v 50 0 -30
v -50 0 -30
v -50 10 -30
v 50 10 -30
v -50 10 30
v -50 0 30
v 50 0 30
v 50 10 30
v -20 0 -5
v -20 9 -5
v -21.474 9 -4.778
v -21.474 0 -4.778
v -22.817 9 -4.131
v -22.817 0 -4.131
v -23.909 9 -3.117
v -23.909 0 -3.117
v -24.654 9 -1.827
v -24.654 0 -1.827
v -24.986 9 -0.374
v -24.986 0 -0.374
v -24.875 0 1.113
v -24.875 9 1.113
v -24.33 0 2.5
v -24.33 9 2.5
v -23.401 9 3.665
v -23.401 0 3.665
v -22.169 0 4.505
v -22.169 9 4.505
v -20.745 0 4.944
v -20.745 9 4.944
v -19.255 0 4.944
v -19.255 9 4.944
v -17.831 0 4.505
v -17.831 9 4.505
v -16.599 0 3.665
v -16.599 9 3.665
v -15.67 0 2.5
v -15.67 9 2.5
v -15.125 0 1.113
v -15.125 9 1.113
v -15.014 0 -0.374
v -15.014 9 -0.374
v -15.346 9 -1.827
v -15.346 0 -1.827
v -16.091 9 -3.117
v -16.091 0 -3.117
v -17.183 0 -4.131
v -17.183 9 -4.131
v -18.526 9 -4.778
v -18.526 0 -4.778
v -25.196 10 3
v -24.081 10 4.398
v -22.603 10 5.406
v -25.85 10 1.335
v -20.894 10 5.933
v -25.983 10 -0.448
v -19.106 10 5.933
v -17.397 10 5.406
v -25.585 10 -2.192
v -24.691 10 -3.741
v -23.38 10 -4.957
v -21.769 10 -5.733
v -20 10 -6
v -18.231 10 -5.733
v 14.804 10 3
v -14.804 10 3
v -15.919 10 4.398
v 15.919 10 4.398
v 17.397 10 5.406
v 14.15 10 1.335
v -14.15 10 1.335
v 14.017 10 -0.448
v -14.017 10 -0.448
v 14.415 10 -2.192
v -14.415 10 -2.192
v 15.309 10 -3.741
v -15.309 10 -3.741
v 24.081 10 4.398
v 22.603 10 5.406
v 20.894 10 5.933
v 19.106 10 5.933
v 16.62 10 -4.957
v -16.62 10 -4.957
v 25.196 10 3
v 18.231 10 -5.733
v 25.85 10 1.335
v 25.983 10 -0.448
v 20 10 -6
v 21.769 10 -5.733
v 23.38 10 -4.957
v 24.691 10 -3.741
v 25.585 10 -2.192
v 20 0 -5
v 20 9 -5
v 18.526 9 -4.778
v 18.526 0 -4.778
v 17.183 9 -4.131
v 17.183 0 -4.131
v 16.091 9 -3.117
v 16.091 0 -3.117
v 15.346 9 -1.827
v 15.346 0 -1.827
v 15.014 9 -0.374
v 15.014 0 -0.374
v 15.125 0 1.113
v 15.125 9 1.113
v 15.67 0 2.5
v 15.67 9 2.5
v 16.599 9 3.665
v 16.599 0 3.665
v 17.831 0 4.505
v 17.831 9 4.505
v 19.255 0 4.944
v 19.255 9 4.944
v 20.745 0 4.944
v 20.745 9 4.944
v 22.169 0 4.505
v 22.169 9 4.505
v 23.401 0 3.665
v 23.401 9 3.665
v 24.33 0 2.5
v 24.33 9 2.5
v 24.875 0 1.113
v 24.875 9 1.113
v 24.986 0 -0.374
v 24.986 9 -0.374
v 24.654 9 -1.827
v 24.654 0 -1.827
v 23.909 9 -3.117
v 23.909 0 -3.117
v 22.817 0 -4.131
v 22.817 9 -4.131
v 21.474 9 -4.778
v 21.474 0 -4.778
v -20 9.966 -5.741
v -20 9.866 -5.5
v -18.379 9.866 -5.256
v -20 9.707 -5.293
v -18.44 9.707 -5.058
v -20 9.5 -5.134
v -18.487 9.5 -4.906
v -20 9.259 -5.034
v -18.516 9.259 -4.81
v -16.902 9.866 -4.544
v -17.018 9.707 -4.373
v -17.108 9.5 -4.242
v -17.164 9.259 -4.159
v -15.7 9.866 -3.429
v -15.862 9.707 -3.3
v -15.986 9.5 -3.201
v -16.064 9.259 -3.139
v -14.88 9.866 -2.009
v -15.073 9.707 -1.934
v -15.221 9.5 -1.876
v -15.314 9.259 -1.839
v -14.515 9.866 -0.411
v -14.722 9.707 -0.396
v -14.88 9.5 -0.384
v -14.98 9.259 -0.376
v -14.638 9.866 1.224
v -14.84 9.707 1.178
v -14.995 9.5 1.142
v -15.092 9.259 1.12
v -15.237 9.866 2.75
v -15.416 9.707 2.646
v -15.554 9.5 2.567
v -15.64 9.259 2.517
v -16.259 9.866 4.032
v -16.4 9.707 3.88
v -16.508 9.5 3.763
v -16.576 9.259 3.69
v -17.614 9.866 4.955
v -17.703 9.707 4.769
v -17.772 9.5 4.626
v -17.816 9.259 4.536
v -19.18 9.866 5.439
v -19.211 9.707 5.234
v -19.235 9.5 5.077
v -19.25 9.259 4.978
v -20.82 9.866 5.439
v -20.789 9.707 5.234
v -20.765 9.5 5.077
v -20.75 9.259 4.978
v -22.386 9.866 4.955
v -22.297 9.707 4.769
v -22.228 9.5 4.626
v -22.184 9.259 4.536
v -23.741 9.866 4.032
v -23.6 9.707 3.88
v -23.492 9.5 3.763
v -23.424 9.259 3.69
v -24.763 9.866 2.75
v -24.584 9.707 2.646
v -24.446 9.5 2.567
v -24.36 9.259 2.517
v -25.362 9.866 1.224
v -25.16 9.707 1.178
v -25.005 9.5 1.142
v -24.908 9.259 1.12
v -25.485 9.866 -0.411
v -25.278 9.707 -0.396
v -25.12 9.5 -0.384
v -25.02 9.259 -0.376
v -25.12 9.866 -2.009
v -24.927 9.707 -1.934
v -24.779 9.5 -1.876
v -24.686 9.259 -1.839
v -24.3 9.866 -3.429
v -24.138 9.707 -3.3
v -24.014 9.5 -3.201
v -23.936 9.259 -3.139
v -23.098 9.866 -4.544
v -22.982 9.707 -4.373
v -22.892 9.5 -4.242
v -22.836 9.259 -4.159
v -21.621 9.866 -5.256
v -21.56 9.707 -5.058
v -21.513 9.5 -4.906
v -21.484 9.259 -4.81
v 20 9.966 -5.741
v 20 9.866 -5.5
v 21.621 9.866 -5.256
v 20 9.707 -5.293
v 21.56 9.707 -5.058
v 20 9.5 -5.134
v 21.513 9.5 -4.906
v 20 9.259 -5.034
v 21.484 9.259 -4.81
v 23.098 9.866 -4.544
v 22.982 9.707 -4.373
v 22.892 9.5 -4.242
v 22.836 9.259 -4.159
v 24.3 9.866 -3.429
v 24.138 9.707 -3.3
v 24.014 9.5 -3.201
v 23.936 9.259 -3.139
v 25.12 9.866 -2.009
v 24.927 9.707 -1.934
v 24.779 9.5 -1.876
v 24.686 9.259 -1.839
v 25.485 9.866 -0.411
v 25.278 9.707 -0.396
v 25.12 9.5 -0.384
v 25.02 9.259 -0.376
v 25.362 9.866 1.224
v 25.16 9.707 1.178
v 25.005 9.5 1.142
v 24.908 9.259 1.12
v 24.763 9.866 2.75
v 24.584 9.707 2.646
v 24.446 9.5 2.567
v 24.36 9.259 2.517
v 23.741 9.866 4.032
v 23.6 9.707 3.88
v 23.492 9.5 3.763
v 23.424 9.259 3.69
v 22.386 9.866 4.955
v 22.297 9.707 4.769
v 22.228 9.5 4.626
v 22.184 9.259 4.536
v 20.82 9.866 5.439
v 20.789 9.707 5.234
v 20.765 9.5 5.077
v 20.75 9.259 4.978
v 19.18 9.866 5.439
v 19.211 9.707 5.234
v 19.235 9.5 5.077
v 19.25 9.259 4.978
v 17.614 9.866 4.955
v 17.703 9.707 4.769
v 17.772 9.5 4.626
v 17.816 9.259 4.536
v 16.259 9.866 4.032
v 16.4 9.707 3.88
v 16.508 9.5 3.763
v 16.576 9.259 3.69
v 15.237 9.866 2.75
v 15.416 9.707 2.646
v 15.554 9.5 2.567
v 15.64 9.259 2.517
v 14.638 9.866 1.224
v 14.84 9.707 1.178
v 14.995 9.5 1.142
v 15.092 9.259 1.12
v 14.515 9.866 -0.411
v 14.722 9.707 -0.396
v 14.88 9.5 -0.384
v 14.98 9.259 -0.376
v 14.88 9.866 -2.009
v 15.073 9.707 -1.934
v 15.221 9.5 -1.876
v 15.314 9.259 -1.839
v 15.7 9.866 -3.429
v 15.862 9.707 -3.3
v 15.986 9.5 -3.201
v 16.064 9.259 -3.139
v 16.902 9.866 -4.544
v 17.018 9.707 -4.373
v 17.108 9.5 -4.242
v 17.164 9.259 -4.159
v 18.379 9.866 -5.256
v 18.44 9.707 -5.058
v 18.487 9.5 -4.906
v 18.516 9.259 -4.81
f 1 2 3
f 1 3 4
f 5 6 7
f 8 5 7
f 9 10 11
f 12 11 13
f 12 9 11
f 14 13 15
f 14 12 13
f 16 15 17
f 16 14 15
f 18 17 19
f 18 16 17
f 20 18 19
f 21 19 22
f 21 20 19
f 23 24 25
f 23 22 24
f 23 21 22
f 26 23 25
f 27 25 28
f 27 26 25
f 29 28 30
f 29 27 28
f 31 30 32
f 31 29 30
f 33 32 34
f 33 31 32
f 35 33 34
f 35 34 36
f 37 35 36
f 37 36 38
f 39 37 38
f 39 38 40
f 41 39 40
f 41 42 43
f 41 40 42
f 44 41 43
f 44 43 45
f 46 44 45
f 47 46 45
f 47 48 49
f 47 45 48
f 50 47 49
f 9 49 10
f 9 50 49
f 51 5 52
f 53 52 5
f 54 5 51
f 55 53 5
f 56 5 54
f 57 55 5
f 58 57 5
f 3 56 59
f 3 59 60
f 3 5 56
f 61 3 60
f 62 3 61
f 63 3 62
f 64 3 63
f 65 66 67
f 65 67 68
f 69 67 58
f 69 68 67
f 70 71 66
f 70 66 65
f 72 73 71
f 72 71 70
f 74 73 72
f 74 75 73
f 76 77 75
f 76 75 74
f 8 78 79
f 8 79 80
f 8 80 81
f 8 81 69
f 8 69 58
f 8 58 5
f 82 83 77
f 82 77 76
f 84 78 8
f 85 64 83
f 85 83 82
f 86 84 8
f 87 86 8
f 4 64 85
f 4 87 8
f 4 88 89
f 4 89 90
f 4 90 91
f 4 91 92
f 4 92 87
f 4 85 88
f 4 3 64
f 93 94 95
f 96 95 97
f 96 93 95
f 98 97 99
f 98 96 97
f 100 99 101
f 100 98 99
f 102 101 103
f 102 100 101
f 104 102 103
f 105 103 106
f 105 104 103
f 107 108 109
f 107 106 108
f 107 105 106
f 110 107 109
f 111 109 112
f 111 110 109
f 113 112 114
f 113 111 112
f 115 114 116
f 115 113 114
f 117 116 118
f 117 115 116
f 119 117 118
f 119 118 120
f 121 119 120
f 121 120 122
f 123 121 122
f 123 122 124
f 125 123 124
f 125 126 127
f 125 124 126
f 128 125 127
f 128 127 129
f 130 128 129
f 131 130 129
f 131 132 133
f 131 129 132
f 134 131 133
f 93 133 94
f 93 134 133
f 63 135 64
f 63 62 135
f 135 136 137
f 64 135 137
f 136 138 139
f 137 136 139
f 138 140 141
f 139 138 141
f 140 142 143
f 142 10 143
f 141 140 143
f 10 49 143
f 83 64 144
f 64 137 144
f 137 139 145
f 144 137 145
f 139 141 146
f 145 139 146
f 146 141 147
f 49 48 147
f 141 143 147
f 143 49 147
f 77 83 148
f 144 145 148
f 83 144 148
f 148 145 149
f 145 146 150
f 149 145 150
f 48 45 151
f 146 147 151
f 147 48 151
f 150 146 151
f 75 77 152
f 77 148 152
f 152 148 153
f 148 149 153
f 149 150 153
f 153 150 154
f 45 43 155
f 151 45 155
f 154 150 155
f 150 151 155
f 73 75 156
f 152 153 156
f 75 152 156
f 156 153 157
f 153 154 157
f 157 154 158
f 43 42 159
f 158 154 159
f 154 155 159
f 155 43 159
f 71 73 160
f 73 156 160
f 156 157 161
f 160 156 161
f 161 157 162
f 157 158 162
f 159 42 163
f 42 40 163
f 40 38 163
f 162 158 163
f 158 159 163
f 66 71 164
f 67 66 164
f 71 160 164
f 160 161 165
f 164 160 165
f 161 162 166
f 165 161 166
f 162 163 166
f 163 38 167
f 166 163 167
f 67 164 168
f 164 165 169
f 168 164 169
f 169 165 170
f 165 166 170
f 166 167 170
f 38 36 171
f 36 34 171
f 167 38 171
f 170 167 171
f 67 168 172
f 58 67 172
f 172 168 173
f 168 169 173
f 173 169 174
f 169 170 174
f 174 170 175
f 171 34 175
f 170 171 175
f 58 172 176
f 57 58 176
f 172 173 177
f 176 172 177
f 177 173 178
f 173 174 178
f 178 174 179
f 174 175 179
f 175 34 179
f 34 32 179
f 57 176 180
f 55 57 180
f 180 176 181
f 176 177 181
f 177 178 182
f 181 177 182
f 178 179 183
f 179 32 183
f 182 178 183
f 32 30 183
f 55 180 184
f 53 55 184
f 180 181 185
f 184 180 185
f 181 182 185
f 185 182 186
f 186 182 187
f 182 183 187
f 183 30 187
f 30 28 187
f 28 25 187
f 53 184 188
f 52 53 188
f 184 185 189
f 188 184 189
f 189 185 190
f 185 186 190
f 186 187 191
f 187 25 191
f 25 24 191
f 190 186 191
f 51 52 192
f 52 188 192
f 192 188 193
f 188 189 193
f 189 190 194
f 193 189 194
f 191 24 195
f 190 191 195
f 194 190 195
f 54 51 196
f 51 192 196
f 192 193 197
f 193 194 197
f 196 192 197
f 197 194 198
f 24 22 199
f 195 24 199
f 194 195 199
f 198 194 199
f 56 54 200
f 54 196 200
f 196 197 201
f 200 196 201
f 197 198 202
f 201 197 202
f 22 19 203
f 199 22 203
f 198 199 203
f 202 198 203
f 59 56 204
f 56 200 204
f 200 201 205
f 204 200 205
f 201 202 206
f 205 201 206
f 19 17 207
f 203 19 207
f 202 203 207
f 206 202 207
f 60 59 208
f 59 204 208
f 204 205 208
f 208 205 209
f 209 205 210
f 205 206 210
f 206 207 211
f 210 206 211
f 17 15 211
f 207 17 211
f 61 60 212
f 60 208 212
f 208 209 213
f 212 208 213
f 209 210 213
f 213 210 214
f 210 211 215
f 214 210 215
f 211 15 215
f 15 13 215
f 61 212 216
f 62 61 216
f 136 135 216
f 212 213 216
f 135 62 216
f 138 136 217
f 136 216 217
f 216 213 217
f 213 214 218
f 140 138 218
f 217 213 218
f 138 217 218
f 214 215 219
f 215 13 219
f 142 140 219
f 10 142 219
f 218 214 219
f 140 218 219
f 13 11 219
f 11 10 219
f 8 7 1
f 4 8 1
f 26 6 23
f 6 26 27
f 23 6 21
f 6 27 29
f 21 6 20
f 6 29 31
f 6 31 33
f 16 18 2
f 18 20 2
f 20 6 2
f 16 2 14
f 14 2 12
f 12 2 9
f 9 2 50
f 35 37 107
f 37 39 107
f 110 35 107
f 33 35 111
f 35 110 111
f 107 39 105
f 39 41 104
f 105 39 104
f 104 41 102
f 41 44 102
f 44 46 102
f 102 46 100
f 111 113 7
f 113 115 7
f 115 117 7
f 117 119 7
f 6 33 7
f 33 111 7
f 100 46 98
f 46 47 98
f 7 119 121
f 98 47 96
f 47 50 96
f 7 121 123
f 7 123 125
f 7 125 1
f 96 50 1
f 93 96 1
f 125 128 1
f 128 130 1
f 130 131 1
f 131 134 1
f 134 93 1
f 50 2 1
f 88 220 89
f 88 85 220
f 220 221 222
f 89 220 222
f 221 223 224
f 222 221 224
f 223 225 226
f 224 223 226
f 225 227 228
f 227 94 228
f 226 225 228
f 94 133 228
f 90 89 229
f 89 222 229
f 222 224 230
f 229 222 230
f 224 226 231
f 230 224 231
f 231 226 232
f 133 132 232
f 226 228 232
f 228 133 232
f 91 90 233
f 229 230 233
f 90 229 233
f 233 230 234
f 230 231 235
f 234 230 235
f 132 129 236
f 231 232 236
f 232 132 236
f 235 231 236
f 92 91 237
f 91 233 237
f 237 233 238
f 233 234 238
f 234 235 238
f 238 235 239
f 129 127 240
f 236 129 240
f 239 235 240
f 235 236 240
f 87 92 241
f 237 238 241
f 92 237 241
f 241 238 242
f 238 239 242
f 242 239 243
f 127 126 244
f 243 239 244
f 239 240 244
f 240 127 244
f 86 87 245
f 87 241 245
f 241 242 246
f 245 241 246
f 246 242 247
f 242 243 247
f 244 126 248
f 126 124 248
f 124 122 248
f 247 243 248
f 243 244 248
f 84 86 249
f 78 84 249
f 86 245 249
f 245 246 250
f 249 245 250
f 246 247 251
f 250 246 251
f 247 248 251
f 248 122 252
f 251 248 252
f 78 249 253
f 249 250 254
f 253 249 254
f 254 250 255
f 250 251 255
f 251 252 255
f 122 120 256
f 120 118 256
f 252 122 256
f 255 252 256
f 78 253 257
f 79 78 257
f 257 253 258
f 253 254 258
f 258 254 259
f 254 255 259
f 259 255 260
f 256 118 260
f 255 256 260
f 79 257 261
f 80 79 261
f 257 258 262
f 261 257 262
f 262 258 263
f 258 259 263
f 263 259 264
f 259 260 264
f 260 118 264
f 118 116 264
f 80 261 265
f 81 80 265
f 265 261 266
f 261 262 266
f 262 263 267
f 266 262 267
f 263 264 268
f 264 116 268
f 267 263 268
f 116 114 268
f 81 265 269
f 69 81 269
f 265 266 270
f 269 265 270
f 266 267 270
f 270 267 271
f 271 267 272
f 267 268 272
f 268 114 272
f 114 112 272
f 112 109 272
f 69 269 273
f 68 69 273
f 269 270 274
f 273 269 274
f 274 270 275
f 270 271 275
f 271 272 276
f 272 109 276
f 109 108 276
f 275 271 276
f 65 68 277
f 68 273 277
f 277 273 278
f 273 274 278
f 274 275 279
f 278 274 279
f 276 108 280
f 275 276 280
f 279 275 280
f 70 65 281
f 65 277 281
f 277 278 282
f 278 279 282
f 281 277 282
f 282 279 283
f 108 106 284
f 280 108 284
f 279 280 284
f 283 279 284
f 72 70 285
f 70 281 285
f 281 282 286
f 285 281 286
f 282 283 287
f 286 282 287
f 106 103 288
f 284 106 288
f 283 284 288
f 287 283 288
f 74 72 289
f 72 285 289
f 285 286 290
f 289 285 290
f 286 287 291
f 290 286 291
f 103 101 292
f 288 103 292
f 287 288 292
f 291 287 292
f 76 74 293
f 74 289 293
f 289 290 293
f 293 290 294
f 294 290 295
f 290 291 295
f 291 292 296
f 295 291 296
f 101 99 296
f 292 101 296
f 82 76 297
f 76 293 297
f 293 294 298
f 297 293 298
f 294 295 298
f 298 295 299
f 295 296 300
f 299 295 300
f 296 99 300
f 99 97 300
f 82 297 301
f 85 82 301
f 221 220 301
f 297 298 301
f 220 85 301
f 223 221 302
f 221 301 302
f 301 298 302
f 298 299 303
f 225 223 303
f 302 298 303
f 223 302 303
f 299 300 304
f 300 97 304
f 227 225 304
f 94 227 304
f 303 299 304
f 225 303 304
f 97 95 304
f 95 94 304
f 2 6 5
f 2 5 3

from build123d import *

# Parameters (mm, degrees)
SKETCH_1_W          = 100
SKETCH_1_H          = 60
EXTRUDE_1_DEPTH     = 10
SKETCH_2_R          = 5
CUT_EXTRUDE_1_DEPTH = 20
SKETCH_3_R          = 5
CUT_EXTRUDE_2_DEPTH = 20
FILLET_1_R          = 1


with BuildPart() as part:
    # 草图1 → 凸台-拉伸1 (new body)
    with BuildSketch(Plane(origin=(0, 0, 0), x_dir=(1, 0, 0), z_dir=(0, 1, 0))):
        Rectangle(SKETCH_1_W, SKETCH_1_H)
    extrude(amount=EXTRUDE_1_DEPTH)

    # 草图2 → 切除-拉伸1 (cut)
    with BuildSketch(Plane(origin=(0, 0, 0), x_dir=(1, 0, 0), z_dir=(0, 1, 0))):
        with Locations(Location((-20, 0, 0), (0, 0, 90))):
            Circle(SKETCH_2_R)
    extrude(amount=CUT_EXTRUDE_1_DEPTH, mode=Mode.SUBTRACT)

    # 草图3 → 切除-拉伸2 (cut)
    with BuildSketch(Plane(origin=(0, 0, 0), x_dir=(1, 0, 0), z_dir=(0, 1, 0))):
        with Locations(Location((20, 0, 0), (0, 0, 90))):
            Circle(SKETCH_3_R)
    extrude(amount=CUT_EXTRUDE_2_DEPTH, mode=Mode.SUBTRACT)

    # 圆角1
    fillet_1_edges = [part.edges().sort_by_distance(p)[0] for p in [
        (-20, 10, 5),
        (20, 10, 5),
    ]]
    fillet(fillet_1_edges, radius=FILLET_1_R)


solid = part.part
